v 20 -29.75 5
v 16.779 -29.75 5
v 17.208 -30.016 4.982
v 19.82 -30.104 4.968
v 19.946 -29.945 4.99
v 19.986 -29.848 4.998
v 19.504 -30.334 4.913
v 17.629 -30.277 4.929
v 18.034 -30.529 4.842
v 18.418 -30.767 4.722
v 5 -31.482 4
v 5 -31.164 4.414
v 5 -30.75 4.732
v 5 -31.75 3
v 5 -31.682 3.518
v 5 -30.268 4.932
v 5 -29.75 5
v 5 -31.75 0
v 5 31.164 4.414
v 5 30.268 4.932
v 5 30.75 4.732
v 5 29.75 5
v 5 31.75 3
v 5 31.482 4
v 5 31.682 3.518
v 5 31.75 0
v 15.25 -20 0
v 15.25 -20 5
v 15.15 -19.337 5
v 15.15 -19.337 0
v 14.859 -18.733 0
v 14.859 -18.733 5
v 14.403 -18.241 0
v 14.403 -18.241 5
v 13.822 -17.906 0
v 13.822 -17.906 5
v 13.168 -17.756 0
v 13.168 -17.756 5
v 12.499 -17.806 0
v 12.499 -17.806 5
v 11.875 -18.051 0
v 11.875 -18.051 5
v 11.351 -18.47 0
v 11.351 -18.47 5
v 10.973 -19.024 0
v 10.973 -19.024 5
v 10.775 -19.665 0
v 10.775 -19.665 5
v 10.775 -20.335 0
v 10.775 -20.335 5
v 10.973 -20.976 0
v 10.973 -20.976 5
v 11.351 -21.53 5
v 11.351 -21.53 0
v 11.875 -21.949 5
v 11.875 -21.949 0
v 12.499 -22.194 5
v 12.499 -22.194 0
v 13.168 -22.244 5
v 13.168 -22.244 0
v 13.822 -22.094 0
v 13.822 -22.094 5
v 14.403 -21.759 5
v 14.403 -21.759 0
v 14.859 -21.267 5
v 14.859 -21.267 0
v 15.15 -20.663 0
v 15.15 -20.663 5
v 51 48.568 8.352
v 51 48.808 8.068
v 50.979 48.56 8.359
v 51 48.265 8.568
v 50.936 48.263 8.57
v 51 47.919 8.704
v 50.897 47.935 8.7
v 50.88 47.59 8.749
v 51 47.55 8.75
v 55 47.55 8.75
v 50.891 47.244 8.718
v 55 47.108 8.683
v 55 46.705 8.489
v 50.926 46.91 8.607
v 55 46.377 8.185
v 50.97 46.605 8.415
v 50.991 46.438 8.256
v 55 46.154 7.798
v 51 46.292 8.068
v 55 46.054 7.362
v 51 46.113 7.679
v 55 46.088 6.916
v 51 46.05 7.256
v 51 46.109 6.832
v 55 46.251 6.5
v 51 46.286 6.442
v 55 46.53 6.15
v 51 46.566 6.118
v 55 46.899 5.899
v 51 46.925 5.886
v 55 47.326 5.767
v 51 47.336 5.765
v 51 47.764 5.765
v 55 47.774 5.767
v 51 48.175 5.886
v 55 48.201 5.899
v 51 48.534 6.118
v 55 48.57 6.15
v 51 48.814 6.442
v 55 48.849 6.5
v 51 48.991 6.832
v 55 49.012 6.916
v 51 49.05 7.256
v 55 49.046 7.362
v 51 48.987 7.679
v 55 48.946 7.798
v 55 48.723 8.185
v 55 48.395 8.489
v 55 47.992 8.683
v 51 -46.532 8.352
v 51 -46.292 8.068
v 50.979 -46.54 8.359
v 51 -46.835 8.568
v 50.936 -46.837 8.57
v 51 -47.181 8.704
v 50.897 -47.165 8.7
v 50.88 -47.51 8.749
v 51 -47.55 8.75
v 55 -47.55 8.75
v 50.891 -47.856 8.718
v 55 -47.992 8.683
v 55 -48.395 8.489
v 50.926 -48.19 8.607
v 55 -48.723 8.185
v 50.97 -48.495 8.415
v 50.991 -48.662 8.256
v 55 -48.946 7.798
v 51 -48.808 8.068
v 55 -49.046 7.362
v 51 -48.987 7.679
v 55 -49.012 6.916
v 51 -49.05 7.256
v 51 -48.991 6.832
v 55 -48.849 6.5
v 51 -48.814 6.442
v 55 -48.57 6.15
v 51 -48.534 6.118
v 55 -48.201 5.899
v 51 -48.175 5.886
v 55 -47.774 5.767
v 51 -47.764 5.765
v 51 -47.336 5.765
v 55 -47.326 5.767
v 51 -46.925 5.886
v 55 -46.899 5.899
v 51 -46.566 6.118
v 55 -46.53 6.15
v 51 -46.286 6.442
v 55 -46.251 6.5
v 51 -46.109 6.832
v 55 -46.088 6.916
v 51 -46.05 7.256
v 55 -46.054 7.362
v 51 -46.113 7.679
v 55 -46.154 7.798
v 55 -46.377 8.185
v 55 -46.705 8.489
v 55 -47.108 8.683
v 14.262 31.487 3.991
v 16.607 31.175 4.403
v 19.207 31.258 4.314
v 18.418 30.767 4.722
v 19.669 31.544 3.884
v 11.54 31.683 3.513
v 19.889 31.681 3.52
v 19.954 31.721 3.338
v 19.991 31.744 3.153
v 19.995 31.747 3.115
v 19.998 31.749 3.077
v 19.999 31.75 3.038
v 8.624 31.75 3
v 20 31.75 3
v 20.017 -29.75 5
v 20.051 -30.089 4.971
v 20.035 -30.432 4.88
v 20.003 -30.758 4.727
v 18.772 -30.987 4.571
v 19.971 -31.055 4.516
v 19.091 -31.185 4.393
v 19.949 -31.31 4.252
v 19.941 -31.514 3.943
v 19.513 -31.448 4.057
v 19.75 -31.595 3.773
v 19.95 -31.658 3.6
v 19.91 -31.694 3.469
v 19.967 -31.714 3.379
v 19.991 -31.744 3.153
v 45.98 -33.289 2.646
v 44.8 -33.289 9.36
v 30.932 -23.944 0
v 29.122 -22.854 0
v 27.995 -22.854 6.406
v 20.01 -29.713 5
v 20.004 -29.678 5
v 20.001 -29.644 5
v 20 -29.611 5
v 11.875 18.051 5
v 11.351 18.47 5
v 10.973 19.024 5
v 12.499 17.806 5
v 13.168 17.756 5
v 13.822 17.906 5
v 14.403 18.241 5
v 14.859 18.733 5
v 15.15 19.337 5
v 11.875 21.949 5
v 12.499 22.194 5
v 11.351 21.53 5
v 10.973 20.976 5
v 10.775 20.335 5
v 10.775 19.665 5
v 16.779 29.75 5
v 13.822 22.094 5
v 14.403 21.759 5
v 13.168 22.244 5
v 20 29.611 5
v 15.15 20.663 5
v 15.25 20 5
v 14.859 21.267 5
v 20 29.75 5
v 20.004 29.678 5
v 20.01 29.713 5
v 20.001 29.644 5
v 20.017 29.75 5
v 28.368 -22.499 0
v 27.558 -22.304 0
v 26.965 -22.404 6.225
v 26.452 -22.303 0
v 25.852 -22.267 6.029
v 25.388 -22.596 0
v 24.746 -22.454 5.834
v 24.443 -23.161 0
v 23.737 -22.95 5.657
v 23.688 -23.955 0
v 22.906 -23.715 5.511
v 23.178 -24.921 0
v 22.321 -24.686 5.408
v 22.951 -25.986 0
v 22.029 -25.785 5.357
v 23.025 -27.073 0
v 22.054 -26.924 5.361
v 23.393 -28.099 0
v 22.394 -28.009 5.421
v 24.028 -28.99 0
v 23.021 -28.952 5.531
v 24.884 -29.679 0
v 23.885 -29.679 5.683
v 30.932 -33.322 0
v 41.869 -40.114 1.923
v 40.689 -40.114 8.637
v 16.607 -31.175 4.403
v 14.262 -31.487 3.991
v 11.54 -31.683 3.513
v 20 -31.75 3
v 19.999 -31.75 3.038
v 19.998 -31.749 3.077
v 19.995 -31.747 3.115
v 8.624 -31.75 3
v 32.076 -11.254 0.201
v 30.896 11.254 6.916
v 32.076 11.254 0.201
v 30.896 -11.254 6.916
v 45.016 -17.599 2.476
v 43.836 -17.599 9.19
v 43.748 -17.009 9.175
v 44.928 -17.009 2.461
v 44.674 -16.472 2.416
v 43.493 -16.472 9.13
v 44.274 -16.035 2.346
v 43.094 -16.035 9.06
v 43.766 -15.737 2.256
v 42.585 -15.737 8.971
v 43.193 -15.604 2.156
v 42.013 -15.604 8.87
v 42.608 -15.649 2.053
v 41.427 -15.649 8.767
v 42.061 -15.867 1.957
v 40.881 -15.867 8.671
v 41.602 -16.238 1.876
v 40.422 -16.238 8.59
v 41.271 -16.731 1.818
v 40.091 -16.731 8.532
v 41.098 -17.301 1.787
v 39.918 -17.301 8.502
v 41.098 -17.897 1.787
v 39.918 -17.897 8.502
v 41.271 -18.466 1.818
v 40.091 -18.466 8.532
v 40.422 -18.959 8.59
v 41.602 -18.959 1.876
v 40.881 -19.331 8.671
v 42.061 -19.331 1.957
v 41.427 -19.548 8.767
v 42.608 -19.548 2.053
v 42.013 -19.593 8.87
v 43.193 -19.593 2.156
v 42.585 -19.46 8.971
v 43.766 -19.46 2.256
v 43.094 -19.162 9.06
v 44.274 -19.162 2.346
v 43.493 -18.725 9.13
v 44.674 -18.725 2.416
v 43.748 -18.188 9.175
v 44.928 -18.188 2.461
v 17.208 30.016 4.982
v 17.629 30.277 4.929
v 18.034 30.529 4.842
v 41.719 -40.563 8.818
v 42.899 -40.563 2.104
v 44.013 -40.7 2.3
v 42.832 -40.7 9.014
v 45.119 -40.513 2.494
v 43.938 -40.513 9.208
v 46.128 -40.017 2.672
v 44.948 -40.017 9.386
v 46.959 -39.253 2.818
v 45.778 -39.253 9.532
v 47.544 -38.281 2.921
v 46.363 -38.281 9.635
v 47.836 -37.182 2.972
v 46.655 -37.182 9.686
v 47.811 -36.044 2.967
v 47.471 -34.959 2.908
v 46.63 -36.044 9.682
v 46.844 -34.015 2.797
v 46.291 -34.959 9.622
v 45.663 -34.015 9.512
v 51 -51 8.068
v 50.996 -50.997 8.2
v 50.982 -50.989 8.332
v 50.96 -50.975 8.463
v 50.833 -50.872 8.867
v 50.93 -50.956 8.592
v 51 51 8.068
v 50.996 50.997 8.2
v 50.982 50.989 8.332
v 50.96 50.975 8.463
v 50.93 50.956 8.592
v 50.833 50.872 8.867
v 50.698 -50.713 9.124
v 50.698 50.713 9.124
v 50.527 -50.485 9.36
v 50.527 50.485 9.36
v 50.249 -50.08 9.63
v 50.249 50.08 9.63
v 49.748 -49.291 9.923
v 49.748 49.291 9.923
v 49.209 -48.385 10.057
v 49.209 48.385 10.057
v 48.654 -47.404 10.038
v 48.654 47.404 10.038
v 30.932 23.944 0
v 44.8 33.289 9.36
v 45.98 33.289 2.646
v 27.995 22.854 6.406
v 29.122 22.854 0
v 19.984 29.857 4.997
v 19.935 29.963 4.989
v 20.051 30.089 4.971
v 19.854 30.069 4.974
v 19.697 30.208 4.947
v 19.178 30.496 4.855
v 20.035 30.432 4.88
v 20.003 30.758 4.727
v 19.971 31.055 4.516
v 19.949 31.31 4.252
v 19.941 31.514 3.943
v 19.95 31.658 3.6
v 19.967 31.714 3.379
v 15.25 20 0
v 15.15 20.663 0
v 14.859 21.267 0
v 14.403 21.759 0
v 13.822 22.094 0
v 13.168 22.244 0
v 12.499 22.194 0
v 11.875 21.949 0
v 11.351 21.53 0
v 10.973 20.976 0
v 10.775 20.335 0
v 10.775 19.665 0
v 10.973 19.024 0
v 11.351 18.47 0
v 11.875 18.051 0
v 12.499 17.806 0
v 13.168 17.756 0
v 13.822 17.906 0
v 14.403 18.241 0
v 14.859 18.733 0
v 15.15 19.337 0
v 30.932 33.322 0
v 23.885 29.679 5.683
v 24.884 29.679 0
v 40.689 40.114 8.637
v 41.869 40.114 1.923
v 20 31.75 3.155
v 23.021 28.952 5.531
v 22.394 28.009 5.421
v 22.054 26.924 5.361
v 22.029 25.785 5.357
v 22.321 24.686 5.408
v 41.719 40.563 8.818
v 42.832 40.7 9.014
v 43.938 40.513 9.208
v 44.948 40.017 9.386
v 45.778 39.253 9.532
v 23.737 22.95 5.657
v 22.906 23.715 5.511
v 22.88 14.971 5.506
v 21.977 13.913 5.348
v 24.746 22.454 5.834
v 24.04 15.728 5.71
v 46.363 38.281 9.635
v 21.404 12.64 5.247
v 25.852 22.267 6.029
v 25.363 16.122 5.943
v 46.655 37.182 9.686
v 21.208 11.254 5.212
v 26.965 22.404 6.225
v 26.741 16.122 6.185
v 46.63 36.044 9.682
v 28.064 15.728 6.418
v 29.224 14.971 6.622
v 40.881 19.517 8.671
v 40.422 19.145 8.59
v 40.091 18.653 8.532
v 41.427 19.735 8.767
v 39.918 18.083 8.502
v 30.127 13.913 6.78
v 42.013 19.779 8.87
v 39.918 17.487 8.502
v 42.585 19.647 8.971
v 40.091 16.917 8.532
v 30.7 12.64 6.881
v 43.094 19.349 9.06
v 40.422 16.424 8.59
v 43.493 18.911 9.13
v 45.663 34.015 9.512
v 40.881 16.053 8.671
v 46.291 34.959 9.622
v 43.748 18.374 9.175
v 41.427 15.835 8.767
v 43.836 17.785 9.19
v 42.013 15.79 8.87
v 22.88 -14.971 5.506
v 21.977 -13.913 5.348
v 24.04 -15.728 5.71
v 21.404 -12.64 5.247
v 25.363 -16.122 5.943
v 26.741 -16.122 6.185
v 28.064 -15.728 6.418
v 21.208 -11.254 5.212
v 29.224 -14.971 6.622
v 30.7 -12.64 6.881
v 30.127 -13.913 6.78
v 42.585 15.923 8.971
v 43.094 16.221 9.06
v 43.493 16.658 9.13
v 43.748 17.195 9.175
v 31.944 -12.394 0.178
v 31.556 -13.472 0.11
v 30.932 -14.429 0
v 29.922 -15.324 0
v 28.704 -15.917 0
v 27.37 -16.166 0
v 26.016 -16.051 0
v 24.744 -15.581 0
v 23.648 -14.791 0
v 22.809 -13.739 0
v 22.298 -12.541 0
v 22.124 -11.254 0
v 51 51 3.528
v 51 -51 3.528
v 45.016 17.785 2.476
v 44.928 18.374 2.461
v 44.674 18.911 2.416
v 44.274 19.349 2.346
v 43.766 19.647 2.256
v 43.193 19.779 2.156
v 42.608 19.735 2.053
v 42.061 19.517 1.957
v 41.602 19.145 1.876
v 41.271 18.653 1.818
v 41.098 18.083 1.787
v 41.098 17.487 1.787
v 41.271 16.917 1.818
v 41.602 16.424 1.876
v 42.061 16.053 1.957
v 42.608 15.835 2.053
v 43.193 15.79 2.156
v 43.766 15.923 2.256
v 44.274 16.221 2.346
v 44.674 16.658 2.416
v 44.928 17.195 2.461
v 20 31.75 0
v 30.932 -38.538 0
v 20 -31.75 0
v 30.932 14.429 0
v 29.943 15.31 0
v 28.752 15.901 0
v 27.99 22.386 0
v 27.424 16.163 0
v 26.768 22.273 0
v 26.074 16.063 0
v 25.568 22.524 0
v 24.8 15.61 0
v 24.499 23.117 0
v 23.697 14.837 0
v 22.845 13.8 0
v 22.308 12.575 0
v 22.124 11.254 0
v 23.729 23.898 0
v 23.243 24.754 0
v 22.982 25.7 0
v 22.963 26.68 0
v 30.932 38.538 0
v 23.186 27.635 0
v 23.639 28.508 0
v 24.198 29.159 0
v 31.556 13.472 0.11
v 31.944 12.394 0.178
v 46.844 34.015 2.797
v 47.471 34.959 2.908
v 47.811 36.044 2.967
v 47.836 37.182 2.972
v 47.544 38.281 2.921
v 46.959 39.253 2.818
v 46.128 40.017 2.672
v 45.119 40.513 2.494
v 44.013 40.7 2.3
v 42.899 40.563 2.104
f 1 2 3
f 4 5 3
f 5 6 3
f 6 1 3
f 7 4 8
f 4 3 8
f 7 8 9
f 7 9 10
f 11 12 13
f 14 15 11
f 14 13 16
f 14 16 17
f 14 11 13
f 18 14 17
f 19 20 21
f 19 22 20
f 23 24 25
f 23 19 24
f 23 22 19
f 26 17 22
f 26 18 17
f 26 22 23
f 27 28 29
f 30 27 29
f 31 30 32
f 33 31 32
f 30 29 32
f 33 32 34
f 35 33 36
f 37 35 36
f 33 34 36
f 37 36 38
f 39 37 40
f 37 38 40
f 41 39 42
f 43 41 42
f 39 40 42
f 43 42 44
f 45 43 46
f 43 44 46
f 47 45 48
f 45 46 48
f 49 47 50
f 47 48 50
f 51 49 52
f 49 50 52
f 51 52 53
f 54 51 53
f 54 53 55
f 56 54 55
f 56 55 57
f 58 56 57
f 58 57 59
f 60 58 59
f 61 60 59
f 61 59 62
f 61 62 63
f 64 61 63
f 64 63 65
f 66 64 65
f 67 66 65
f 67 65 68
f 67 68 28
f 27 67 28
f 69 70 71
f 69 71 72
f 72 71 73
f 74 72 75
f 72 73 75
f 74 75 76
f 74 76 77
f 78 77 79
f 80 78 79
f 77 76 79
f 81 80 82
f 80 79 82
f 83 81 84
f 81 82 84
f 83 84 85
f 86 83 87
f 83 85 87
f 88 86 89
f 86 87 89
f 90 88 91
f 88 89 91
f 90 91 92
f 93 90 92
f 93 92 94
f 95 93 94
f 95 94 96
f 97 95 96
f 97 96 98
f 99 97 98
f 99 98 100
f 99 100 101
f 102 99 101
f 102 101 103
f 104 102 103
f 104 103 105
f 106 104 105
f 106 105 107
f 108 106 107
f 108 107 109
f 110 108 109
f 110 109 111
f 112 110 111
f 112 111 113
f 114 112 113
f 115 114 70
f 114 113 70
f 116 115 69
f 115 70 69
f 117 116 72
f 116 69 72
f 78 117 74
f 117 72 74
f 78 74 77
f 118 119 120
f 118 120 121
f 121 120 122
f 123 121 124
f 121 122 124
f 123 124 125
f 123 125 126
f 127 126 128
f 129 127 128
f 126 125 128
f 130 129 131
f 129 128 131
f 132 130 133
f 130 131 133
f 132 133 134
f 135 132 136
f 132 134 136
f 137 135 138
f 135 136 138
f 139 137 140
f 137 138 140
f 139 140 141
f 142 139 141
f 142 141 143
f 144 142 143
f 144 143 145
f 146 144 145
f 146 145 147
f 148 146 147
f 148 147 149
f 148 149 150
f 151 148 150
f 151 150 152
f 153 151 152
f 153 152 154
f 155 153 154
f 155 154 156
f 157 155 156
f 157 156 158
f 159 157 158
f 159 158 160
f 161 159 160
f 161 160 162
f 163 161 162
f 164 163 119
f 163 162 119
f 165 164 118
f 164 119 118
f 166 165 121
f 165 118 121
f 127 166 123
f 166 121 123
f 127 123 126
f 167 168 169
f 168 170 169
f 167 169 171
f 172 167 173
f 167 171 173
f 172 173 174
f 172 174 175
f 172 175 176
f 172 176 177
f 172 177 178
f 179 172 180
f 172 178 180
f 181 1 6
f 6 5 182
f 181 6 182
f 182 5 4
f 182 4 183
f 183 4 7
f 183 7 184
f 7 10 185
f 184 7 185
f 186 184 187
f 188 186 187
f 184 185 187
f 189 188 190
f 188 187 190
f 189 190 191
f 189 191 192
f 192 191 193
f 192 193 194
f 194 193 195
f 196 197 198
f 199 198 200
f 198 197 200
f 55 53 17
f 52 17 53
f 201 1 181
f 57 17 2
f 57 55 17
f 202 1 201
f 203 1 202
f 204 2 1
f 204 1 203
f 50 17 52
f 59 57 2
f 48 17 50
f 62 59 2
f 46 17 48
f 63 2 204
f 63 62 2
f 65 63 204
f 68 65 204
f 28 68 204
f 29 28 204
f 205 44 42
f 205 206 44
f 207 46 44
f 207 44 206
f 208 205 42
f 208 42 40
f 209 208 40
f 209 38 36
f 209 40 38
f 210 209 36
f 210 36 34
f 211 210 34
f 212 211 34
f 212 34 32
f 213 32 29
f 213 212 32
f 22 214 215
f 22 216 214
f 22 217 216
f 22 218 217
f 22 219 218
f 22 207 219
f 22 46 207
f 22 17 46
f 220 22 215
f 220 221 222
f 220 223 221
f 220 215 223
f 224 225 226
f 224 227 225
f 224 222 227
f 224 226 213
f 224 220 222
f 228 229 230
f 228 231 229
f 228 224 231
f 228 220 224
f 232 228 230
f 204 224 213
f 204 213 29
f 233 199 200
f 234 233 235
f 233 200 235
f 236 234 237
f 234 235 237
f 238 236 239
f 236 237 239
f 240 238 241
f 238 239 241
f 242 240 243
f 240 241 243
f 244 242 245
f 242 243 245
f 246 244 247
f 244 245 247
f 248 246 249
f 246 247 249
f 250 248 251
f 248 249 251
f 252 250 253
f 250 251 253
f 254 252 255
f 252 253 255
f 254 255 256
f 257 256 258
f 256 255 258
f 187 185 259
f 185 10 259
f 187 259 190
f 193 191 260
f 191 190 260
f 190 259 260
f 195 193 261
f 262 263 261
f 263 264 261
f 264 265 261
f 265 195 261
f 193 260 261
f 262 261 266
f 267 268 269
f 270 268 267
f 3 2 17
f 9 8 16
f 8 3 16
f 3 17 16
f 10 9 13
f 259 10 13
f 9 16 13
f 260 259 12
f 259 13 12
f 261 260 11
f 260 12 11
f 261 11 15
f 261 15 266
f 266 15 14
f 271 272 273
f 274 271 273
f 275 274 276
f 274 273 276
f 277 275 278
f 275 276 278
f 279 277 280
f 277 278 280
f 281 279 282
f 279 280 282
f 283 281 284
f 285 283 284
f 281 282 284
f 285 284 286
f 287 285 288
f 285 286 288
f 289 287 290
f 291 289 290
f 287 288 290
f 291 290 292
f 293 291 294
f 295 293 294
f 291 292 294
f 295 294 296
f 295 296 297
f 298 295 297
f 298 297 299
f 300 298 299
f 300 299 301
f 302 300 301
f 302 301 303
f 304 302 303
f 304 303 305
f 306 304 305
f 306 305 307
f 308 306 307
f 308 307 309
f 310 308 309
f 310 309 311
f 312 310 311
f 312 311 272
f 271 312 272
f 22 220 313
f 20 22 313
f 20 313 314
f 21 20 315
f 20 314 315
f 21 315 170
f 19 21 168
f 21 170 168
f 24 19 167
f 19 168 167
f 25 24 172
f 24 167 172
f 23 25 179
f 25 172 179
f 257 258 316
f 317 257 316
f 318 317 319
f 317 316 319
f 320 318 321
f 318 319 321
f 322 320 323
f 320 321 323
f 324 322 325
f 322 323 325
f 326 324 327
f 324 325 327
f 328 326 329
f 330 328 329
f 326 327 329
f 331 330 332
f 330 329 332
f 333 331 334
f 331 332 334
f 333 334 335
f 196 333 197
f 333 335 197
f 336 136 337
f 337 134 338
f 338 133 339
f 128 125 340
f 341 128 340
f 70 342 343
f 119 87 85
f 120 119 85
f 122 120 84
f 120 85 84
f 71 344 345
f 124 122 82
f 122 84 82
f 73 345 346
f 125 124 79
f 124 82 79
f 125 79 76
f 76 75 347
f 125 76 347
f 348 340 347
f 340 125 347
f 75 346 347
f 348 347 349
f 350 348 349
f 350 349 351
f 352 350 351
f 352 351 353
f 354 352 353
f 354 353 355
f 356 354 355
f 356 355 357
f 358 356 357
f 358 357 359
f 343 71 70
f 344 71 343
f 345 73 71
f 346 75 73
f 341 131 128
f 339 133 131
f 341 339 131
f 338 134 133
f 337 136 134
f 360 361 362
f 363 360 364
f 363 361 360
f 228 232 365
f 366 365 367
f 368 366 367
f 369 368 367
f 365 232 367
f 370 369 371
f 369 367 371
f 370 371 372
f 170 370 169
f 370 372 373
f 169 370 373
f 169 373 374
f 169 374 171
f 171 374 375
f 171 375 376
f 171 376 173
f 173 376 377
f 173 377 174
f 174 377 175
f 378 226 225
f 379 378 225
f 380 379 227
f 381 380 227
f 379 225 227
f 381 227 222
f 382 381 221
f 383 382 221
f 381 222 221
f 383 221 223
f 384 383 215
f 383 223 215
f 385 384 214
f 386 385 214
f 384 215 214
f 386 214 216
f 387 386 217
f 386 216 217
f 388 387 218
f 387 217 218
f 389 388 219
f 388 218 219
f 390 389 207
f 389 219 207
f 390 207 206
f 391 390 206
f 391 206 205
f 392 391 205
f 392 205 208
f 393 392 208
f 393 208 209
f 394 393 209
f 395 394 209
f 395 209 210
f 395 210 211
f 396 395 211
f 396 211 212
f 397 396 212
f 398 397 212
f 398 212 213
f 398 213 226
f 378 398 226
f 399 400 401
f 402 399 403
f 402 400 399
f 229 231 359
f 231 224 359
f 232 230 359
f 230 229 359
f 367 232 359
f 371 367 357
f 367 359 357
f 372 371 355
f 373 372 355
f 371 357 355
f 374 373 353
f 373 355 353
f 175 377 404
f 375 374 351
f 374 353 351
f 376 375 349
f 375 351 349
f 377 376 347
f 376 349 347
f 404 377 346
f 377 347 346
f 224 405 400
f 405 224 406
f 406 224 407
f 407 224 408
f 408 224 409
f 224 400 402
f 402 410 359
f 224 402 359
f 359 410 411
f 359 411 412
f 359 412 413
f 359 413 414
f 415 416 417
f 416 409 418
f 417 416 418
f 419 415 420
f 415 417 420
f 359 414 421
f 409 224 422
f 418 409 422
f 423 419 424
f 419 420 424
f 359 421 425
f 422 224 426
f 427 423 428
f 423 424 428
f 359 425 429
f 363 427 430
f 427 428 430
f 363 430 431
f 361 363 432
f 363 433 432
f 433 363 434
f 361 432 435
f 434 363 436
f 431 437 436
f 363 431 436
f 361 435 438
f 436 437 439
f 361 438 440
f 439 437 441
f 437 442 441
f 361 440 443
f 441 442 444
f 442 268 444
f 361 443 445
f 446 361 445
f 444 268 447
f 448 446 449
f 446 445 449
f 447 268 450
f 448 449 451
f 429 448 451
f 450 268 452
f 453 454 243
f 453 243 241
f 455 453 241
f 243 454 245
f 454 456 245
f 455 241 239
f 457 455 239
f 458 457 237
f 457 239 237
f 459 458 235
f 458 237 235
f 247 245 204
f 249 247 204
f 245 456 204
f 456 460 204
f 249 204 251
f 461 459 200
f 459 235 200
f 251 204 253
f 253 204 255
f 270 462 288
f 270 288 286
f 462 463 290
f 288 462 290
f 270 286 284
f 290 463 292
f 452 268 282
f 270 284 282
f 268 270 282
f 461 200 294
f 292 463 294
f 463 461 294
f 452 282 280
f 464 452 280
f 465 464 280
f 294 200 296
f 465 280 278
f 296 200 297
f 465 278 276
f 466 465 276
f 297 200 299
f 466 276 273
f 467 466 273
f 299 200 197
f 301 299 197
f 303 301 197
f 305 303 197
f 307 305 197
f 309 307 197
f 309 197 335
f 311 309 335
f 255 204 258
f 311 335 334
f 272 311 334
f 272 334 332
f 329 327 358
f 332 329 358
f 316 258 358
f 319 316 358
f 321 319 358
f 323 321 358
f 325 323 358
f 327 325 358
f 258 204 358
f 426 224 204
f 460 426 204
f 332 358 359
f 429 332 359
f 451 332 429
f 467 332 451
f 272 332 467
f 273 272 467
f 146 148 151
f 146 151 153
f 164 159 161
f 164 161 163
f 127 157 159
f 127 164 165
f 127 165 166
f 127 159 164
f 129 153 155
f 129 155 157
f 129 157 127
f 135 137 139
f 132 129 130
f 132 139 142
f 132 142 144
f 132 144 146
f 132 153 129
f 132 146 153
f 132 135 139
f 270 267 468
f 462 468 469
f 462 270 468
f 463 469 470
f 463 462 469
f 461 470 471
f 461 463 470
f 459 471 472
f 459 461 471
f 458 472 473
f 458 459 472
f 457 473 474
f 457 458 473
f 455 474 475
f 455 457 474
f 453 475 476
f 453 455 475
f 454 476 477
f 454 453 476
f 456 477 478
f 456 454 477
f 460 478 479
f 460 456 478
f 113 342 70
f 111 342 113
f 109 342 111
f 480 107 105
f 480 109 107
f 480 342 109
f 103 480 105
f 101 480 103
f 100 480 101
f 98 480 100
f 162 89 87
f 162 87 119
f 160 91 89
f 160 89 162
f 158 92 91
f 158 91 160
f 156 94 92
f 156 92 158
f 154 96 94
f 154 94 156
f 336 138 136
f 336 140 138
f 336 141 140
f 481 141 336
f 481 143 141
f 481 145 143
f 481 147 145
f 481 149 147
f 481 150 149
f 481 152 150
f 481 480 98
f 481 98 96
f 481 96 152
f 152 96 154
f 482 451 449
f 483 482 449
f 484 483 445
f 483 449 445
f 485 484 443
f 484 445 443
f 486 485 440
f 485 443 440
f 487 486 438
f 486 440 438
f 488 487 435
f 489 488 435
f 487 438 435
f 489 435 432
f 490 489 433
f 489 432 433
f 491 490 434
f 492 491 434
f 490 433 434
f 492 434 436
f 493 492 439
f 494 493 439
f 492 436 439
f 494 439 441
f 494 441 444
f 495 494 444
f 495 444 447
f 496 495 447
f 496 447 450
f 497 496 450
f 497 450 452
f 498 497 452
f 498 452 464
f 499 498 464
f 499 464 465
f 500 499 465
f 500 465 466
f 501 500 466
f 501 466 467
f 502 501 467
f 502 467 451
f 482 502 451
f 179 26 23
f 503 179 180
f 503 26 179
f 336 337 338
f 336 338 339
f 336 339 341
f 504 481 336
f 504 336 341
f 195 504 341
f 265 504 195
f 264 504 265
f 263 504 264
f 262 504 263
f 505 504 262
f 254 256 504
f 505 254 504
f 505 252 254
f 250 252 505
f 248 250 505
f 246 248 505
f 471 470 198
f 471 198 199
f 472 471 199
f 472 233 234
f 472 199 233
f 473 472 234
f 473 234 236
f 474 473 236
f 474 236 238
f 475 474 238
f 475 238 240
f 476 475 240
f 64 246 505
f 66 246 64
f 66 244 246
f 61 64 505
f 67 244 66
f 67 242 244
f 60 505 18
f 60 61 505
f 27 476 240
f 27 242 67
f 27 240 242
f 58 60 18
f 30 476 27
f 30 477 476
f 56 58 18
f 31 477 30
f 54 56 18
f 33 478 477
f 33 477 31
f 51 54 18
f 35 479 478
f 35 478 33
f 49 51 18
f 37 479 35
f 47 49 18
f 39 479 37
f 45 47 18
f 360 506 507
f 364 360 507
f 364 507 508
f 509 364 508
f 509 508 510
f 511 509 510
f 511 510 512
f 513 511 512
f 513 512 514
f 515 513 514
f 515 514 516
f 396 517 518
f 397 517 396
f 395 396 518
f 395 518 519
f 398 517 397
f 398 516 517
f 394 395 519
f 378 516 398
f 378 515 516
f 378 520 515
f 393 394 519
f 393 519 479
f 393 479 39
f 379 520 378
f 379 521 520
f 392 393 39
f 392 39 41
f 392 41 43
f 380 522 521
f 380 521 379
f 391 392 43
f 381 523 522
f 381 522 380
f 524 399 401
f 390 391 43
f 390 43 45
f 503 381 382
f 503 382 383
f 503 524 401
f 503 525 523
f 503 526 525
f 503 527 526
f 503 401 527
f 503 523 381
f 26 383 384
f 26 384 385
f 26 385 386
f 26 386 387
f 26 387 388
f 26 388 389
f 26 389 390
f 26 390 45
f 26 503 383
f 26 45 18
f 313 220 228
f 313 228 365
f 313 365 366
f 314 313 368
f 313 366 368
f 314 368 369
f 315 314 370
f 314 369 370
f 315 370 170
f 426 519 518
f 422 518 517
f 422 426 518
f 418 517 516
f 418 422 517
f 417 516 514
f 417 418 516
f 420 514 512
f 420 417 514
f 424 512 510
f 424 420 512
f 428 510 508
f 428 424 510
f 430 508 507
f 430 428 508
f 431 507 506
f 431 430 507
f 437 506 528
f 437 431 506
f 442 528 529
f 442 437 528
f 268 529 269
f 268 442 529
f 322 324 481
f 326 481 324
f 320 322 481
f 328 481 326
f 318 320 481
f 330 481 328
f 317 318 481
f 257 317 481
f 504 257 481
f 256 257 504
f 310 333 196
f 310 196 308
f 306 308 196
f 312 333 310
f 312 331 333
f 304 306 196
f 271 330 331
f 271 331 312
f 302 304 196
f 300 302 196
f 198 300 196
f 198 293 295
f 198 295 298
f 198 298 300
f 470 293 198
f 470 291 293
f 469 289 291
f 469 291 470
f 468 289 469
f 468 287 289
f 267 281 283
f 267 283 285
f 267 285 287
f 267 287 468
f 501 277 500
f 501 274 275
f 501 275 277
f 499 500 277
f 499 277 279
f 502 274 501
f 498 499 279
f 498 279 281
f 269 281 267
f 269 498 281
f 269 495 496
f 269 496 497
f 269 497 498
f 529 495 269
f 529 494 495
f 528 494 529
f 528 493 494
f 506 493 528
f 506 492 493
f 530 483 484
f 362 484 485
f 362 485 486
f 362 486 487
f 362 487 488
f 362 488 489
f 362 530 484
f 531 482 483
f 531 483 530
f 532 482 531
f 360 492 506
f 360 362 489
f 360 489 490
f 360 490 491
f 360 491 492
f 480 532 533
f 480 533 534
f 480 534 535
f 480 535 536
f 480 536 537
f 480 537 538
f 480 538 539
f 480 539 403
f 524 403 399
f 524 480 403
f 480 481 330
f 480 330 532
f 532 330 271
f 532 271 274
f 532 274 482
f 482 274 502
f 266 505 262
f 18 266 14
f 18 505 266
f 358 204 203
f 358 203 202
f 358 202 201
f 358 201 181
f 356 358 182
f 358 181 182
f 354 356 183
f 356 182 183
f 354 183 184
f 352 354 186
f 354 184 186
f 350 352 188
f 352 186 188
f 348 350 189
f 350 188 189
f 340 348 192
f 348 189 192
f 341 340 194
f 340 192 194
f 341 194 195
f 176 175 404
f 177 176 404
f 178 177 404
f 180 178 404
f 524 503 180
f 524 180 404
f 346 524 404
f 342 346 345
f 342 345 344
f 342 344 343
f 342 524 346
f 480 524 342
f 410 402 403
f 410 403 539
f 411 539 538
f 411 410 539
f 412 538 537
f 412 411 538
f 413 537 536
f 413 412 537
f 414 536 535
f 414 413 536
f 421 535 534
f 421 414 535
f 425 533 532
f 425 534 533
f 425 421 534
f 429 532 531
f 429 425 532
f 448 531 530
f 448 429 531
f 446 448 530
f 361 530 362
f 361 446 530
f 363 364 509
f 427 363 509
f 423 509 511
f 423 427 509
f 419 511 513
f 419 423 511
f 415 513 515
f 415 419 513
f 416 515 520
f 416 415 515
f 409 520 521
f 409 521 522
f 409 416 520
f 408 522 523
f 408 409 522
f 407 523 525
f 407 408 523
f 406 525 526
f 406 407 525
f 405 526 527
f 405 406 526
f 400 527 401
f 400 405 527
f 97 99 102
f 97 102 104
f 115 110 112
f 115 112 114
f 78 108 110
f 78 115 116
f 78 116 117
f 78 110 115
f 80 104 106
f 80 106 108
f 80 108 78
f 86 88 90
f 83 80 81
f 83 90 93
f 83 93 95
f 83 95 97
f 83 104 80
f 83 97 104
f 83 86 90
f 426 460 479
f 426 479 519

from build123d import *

# Parameters (mm, degrees)
BOSS_EXTRUDE1_DEPTH     = 12
CUT_EXTRUDE1_DEPTH      = 74.116345642
CUT_EXTRUDE1_DEPTH_BACK = 74.116345642
SKETCH4_R               = 1.5
BOSS_EXTRUDE2_DEPTH     = 4
SKETCH5_R               = 2.25
CUT_EXTRUDE2_DEPTH      = 76.204404791
FILLET1_R               = 2
CUT_EXTRUDE6_DEPTH      = 100.869521891
CUT_EXTRUDE6_DEPTH_BACK = 100.869521891
CUT_EXTRUDE7_DEPTH      = 10
CUT_EXTRUDE8_DEPTH      = 76.685850531
SKETCH12_R              = 2
CUT_EXTRUDE9_DEPTH      = 10


with BuildPart() as part:
    # Sketch1 → Boss-Extrude1 (new body)
    with BuildSketch(Plane.XY):
        Polygon((5, 31.75), (20, 31.75), (51, 51), (51, -51), (20, -31.75), (5, -31.75), align=None)
    extrude(amount=BOSS_EXTRUDE1_DEPTH)

    # Sketch3 → Cut-Extrude1 (cut, two sides: drawn at the far end of the back side and taken through both)
    with BuildSketch(Plane(origin=(0, 0, 0), x_dir=(1, 0, 0), z_dir=(0, 1, 0)).offset(-CUT_EXTRUDE1_DEPTH_BACK)):
        Polygon((5, -5), (20, -5), (51, -10.45), (51, -12), (5, -12), align=None)
    extrude(amount=CUT_EXTRUDE1_DEPTH + CUT_EXTRUDE1_DEPTH_BACK, mode=Mode.SUBTRACT)

    # Sketch4 → Boss-Extrude2 (add)
    with BuildSketch(Plane(origin=(51, 0, 0), x_dir=(0, 0, -1), z_dir=(1, 0, 0))):
        with Locations(Location((-7.25, 47.55, 0), (0, 0, 180))):
            Circle(SKETCH4_R)
        with Locations(Location((-7.25, -47.55, 0), (0, 0, 180))):
            Circle(SKETCH4_R)
    extrude(amount=BOSS_EXTRUDE2_DEPTH)

    # Sketch5 → Cut-Extrude2 (cut, through all)
    with BuildSketch(Plane.XY.offset(5)):
        with Locations((13, 20)):
            Circle(SKETCH5_R)
        with Locations((13, -20)):
            Circle(SKETCH5_R)
    extrude(amount=-CUT_EXTRUDE2_DEPTH, mode=Mode.SUBTRACT)

    # Fillet1
    # the kernel refuses this fillet: 2 mm, written as the material it takes off along each edge
    with BuildSketch(Plane(origin=(25, 31.75, 5), x_dir=(0, 0, -1), z_dir=(-1, 0, 0))) as fillet1_piece_1_section:
        with BuildLine():
            CenterArc((FILLET1_R, FILLET1_R), FILLET1_R, 180, 90)
            Line((0, FILLET1_R), (0, 0))
            Line((0, 0), (FILLET1_R, 0))
        make_face()
    fillet1_piece_1 = extrude(amount=25, mode=Mode.PRIVATE)
    fillet1_piece_1 = split(fillet1_piece_1, bisect_by=Plane(origin=(18.715742413, 30.952517466, 4.969963475), z_dir=(0.5275333931354667, -0.8495342954389665, 0)), keep=Keep.TOP, mode=Mode.PRIVATE)
    fillet1_piece_1 = split(fillet1_piece_1, bisect_by=Plane(origin=(18.98425176, 30.56216658, 4.821424906), z_dir=(-0.17315094766757883, 0, 0.9848952986596187)), keep=Keep.TOP, mode=Mode.PRIVATE)
    add(fillet1_piece_1, mode=Mode.SUBTRACT)
    with BuildSketch(Plane(origin=(25, 31.75, 5), x_dir=(0, 0, -1), z_dir=(-1, 0, 0))) as fillet1_piece_2_section:
        with BuildLine():
            CenterArc((FILLET1_R, FILLET1_R), FILLET1_R, 180, 90)
            Line((0, FILLET1_R), (0, 0))
            Line((0, 0), (FILLET1_R, 0))
        make_face()
    fillet1_piece_2 = extrude(amount=25, mode=Mode.PRIVATE)
    fillet1_piece_2 = split(fillet1_piece_2, bisect_by=Plane(origin=(17.89893605, 30.445307063, 4.049330952), z_dir=(-0.5275333931354667, 0.8495342954389665, 0)), keep=Keep.TOP, mode=Mode.PRIVATE)
    fillet1_piece_2 = split(fillet1_piece_2, bisect_by=Plane(origin=(17.101561994, 31.604505702, 4.490435899), z_dir=(0.17315094766757883, 0, -0.9848952986596187)), keep=Keep.TOP, mode=Mode.PRIVATE)
    add(fillet1_piece_2, mode=Mode.SUBTRACT)
    with BuildSketch(Plane(origin=(25, 31.75, 5), x_dir=(0, 0, -1), z_dir=(-1, 0, 0))) as fillet1_piece_3_section:
        with BuildLine():
            CenterArc((FILLET1_R, FILLET1_R), FILLET1_R, 180, 90)
            Line((0, FILLET1_R), (0, 0))
            Line((0, 0), (FILLET1_R, 0))
        make_face()
    fillet1_piece_3 = extrude(amount=25, mode=Mode.PRIVATE)
    fillet1_piece_3 = split(fillet1_piece_3, bisect_by=Plane(origin=(11.619741212, 26.546129624, 4.600643736), z_dir=(-0.5275333931354667, 0.8495342954389665, 0)), keep=Keep.TOP, mode=Mode.PRIVATE)
    fillet1_piece_3 = split(fillet1_piece_3, bisect_by=Plane(origin=(8.954230644, 31.275365282, 3.058082484), z_dir=(-0.17315094766757883, 0, 0.9848952986596187)), keep=Keep.TOP, mode=Mode.PRIVATE)
    add(fillet1_piece_3, mode=Mode.SUBTRACT)
    with BuildSketch(Plane(origin=(54.833361303, 53.380393713, 11.123929648), x_dir=(0.12548912150255187, 0.07792469641690664, -0.9890299399274274), z_dir=(-0.8402148531842905, -0.5217463201224826, -0.14771519193078717))) as fillet1_piece_4_section:
        with BuildLine():
            CenterArc((FILLET1_R * 0.9124716824, FILLET1_R), FILLET1_R, 185.240868247, 84.759131753)
            Line((-FILLET1_R * 0.0833478159779, FILLET1_R * 0.908657093052), (0, 0))
            Line((0, 0), (FILLET1_R * 0.9124716824, 0))
        make_face()
    fillet1_piece_4 = extrude(amount=46.020041731, mode=Mode.PRIVATE)
    fillet1_piece_4 = split(fillet1_piece_4, bisect_by=Plane(origin=(38.858531896, 31.75, 7.92634129), z_dir=(0, 1, 0)), keep=Keep.TOP, mode=Mode.PRIVATE)
    fillet1_piece_4 = split(fillet1_piece_4, bisect_by=Plane(origin=(38.858531896, 42.968514932, 5), z_dir=(0, 0, 1)), keep=Keep.TOP, mode=Mode.PRIVATE)
    add(fillet1_piece_4, mode=Mode.SUBTRACT)
    with BuildSketch(Plane(origin=(54.833361303, 53.380393713, 11.123929648), x_dir=(0.12548912150255187, 0.07792469641690664, -0.9890299399274274), z_dir=(-0.8402148531842905, -0.5217463201224826, -0.14771519193078717))) as fillet1_piece_5_section:
        with BuildLine():
            CenterArc((FILLET1_R * 0.9124716824, FILLET1_R), FILLET1_R, 185.240868247, 84.759131753)
            Line((-FILLET1_R * 0.0833478159779, FILLET1_R * 0.908657093052), (0, 0))
            Line((0, 0), (FILLET1_R * 0.9124716824, 0))
        make_face()
    fillet1_piece_5 = extrude(amount=46.020041731, mode=Mode.PRIVATE)
    fillet1_piece_5 = split(fillet1_piece_5, bisect_by=Plane(origin=(21.093126752, 31.75, 5.163454889), z_dir=(0, -1, 0)), keep=Keep.TOP, mode=Mode.PRIVATE)
    fillet1_piece_5 = split(fillet1_piece_5, bisect_by=Plane(origin=(21.093126752, 31.172659336, 5), z_dir=(0, 0, 1)), keep=Keep.TOP, mode=Mode.PRIVATE)
    add(fillet1_piece_5, mode=Mode.SUBTRACT)
    with BuildSketch(Plane(origin=(54.833361303, 53.380393713, 11.123929648), x_dir=(0.12548912150255187, 0.07792469641690664, -0.9890299399274274), z_dir=(-0.8402148531842905, -0.5217463201224826, -0.14771519193078717))) as fillet1_piece_6_section:
        with BuildLine():
            CenterArc((FILLET1_R * 0.9124716824, FILLET1_R), FILLET1_R, 185.240868247, 84.759131753)
            Line((-FILLET1_R * 0.0833478159779, FILLET1_R * 0.908657093052), (0, 0))
            Line((0, 0), (FILLET1_R * 0.9124716824, 0))
        make_face()
    fillet1_piece_6 = extrude(amount=46.020041731, mode=Mode.PRIVATE)
    fillet1_piece_6 = split(fillet1_piece_6, bisect_by=Plane(origin=(22.647114754, 31.75, 4.574160992), z_dir=(0, 1, 0)), keep=Keep.TOP, mode=Mode.PRIVATE)
    fillet1_piece_6 = split(fillet1_piece_6, bisect_by=Plane(origin=(22.647114754, 33.254110258, 5), z_dir=(0, 0, -1)), keep=Keep.TOP, mode=Mode.PRIVATE)
    add(fillet1_piece_6, mode=Mode.SUBTRACT)
    with BuildSketch(Plane(origin=(16.166638697, -29.369606287, 4.326070352), x_dir=(0.12548912150255273, -0.07792469641690525, -0.9890299399274274), z_dir=(0.8402148531842905, -0.5217463201224826, 0.14771519193078717))) as fillet1_piece_7_section:
        with BuildLine():
            CenterArc((FILLET1_R * 0.9124716824, FILLET1_R), FILLET1_R, 185.240868247, 84.759131753)
            Line((-FILLET1_R * 0.0833478159779, FILLET1_R * 0.908657093052), (0, 0))
            Line((0, 0), (FILLET1_R * 0.9124716824, 0))
        make_face()
    fillet1_piece_7 = extrude(amount=46.020041731, mode=Mode.PRIVATE)
    fillet1_piece_7 = split(fillet1_piece_7, bisect_by=Plane(origin=(21.093126752, -31.172659336, 5), z_dir=(0, 0, 1)), keep=Keep.TOP, mode=Mode.PRIVATE)
    fillet1_piece_7 = split(fillet1_piece_7, bisect_by=Plane(origin=(21.093126752, -31.75, 5.163454889), z_dir=(0, 1, 0)), keep=Keep.TOP, mode=Mode.PRIVATE)
    add(fillet1_piece_7, mode=Mode.SUBTRACT)
    with BuildSketch(Plane(origin=(16.166638697, -29.369606287, 4.326070352), x_dir=(0.12548912150255273, -0.07792469641690525, -0.9890299399274274), z_dir=(0.8402148531842905, -0.5217463201224826, 0.14771519193078717))) as fillet1_piece_8_section:
        with BuildLine():
            CenterArc((FILLET1_R * 0.9124716824, FILLET1_R), FILLET1_R, 185.240868247, 84.759131753)
            Line((-FILLET1_R * 0.0833478159779, FILLET1_R * 0.908657093052), (0, 0))
            Line((0, 0), (FILLET1_R * 0.9124716824, 0))
        make_face()
    fillet1_piece_8 = extrude(amount=46.020041731, mode=Mode.PRIVATE)
    fillet1_piece_8 = split(fillet1_piece_8, bisect_by=Plane(origin=(22.647114754, -33.254110258, 5), z_dir=(0, 0, -1)), keep=Keep.TOP, mode=Mode.PRIVATE)
    fillet1_piece_8 = split(fillet1_piece_8, bisect_by=Plane(origin=(22.647114754, -31.75, 4.574160992), z_dir=(0, -1, 0)), keep=Keep.TOP, mode=Mode.PRIVATE)
    add(fillet1_piece_8, mode=Mode.SUBTRACT)
    with BuildSketch(Plane(origin=(16.166638697, -29.369606287, 4.326070352), x_dir=(0.12548912150255273, -0.07792469641690525, -0.9890299399274274), z_dir=(0.8402148531842905, -0.5217463201224826, 0.14771519193078717))) as fillet1_piece_9_section:
        with BuildLine():
            CenterArc((FILLET1_R * 0.9124716824, FILLET1_R), FILLET1_R, 185.240868247, 84.759131753)
            Line((-FILLET1_R * 0.0833478159779, FILLET1_R * 0.908657093052), (0, 0))
            Line((0, 0), (FILLET1_R * 0.9124716824, 0))
        make_face()
    fillet1_piece_9 = extrude(amount=46.020041731, mode=Mode.PRIVATE)
    fillet1_piece_9 = split(fillet1_piece_9, bisect_by=Plane(origin=(38.858531896, -42.968514932, 5), z_dir=(0, 0, 1)), keep=Keep.TOP, mode=Mode.PRIVATE)
    fillet1_piece_9 = split(fillet1_piece_9, bisect_by=Plane(origin=(38.858531896, -31.75, 7.92634129), z_dir=(0, -1, 0)), keep=Keep.TOP, mode=Mode.PRIVATE)
    add(fillet1_piece_9, mode=Mode.SUBTRACT)
    with BuildSketch(Plane(origin=(0, -31.75, 5), x_dir=(0, 1, 0), z_dir=(1, 0, 0))) as fillet1_piece_10_section:
        with BuildLine():
            CenterArc((FILLET1_R, -FILLET1_R), FILLET1_R, 90, 90)
            Line((0, -FILLET1_R), (0, 0))
            Line((0, 0), (FILLET1_R, 0))
        make_face()
    fillet1_piece_10 = extrude(amount=25, mode=Mode.PRIVATE)
    fillet1_piece_10 = split(fillet1_piece_10, bisect_by=Plane(origin=(8.954230648, -31.275365282, 3.058082485), z_dir=(-0.17315094766757883, 0, 0.9848952986596187)), keep=Keep.TOP, mode=Mode.PRIVATE)
    fillet1_piece_10 = split(fillet1_piece_10, bisect_by=Plane(origin=(11.619741215, -26.546129625, 4.600643736), z_dir=(-0.5275333931354667, -0.8495342954389665, 0)), keep=Keep.TOP, mode=Mode.PRIVATE)
    add(fillet1_piece_10, mode=Mode.SUBTRACT)
    with BuildSketch(Plane(origin=(0, -31.75, 5), x_dir=(0, 1, 0), z_dir=(1, 0, 0))) as fillet1_piece_11_section:
        with BuildLine():
            CenterArc((FILLET1_R, -FILLET1_R), FILLET1_R, 90, 90)
            Line((0, -FILLET1_R), (0, 0))
            Line((0, 0), (FILLET1_R, 0))
        make_face()
    fillet1_piece_11 = extrude(amount=25, mode=Mode.PRIVATE)
    fillet1_piece_11 = split(fillet1_piece_11, bisect_by=Plane(origin=(17.101561993, -31.604505702, 4.490435899), z_dir=(0.17315094766757883, 0, -0.9848952986596187)), keep=Keep.TOP, mode=Mode.PRIVATE)
    fillet1_piece_11 = split(fillet1_piece_11, bisect_by=Plane(origin=(17.89893605, -30.445307063, 4.049330952), z_dir=(-0.5275333931354667, -0.8495342954389665, 0)), keep=Keep.TOP, mode=Mode.PRIVATE)
    add(fillet1_piece_11, mode=Mode.SUBTRACT)
    with BuildSketch(Plane(origin=(0, -31.75, 5), x_dir=(0, 1, 0), z_dir=(1, 0, 0))) as fillet1_piece_12_section:
        with BuildLine():
            CenterArc((FILLET1_R, -FILLET1_R), FILLET1_R, 90, 90)
            Line((0, -FILLET1_R), (0, 0))
            Line((0, 0), (FILLET1_R, 0))
        make_face()
    fillet1_piece_12 = extrude(amount=25, mode=Mode.PRIVATE)
    fillet1_piece_12 = split(fillet1_piece_12, bisect_by=Plane(origin=(18.984251758, -30.56216658, 4.821424906), z_dir=(-0.17315094766757883, 0, 0.9848952986596187)), keep=Keep.TOP, mode=Mode.PRIVATE)
    fillet1_piece_12 = split(fillet1_piece_12, bisect_by=Plane(origin=(18.715742412, -30.952517465, 4.969963474), z_dir=(0.5275333931354667, 0.8495342954389665, 0)), keep=Keep.TOP, mode=Mode.PRIVATE)
    add(fillet1_piece_12, mode=Mode.SUBTRACT)
    with BuildSketch(Plane(origin=(51, 56.95571402, 10.45), x_dir=(0, 0, -1), z_dir=(0, -1, 0))) as fillet1_piece_13_section:
        with BuildLine():
            CenterArc((FILLET1_R * 1.19114280398, -FILLET1_R), FILLET1_R, 90, 99.971072614)
            Line((FILLET1_R * 0.206247505316, -FILLET1_R * 1.17315094767), (0, 0))
            Line((0, 0), (FILLET1_R * 1.19114280398, 0))
        make_face()
    fillet1_piece_13 = extrude(amount=113.91142804, mode=Mode.PRIVATE)
    fillet1_piece_13 = fillet1_piece_13 - Plane(origin=(50.456443641, -47.55, 7.25), x_dir=(0, 0, 1), z_dir=(-1, 0, 0)) * Cylinder(1.5, 238, mode=Mode.PRIVATE)
    fillet1_piece_13 = fillet1_piece_13 - Plane(origin=(50.456443641, 47.55, 7.25), x_dir=(0, 0, 1), z_dir=(-1, 0, 0)) * Cylinder(1.5, 238, mode=Mode.PRIVATE)
    add(fillet1_piece_13, mode=Mode.SUBTRACT)
    with BuildSketch(Plane(origin=(51, 56, 0), x_dir=(-1, 0, 0), z_dir=(0, -1, 0))) as fillet1_piece_14:
        with BuildLine():
            CenterArc((FILLET1_R, -FILLET1_R), FILLET1_R, 90, 90)
            Line((0, -FILLET1_R), (0, 0))
            Line((0, 0), (FILLET1_R, 0))
        make_face()
    extrude(amount=112, mode=Mode.SUBTRACT)
    with BuildSketch(Plane(origin=(25, 31.75, 5), x_dir=(0, 0, -1), z_dir=(-1, 0, 0))) as fillet1_piece_15a_section:
        with BuildLine():
            CenterArc((FILLET1_R, FILLET1_R), FILLET1_R, 180, 90)
            Line((0, FILLET1_R), (0, 0))
            Line((0, 0), (FILLET1_R, 0))
        make_face()
    fillet1_piece_15a = extrude(amount=25, mode=Mode.PRIVATE)
    fillet1_piece_15a = split(fillet1_piece_15a, bisect_by=Plane(origin=(21.447626234, 32.648929194, 4.553184852), z_dir=(0.5275333931354667, -0.8495342954389665, 0)), keep=Keep.TOP, mode=Mode.PRIVATE)
    fillet1_piece_15a = split(fillet1_piece_15a, bisect_by=Plane(origin=(22.147583846, 31.288330463, 5.377559095), z_dir=(0.17315094766757883, 0, -0.9848952986596187)), keep=Keep.TOP, mode=Mode.PRIVATE)
    with BuildSketch(Plane(origin=(54.833361303, 53.380393713, 11.123929648), x_dir=(0.12548912150255187, 0.07792469641690664, -0.9890299399274274), z_dir=(-0.8402148531842905, -0.5217463201224826, -0.14771519193078717))) as fillet1_piece_15b_section:
        with BuildLine():
            CenterArc((FILLET1_R * 0.9124716824, FILLET1_R), FILLET1_R, 185.240868247, 84.759131753)
            Line((-FILLET1_R * 0.0833478159779, FILLET1_R * 0.908657093052), (0, 0))
            Line((0, 0), (FILLET1_R * 0.9124716824, 0))
        make_face()
    fillet1_piece_15b = extrude(amount=46.020041731, mode=Mode.PRIVATE)
    fillet1_piece_15b = split(fillet1_piece_15b, bisect_by=Plane(origin=(18.418601741, 31.75, 4.307776875), z_dir=(0, -1, 0)), keep=Keep.TOP, mode=Mode.PRIVATE)
    fillet1_piece_15b = split(fillet1_piece_15b, bisect_by=Plane(origin=(18.418601741, 30.298172554, 5), z_dir=(0, 0, -1)), keep=Keep.TOP, mode=Mode.PRIVATE)
    fillet1_piece_15 = fillet1_piece_15a & fillet1_piece_15b
    add(fillet1_piece_15, mode=Mode.SUBTRACT)
    with BuildSketch(Plane(origin=(0, -31.75, 5), x_dir=(0, 1, 0), z_dir=(1, 0, 0))) as fillet1_piece_16a_section:
        with BuildLine():
            CenterArc((FILLET1_R, -FILLET1_R), FILLET1_R, 90, 90)
            Line((0, -FILLET1_R), (0, 0))
            Line((0, 0), (FILLET1_R, 0))
        make_face()
    fillet1_piece_16a = extrude(amount=25, mode=Mode.PRIVATE)
    fillet1_piece_16a = split(fillet1_piece_16a, bisect_by=Plane(origin=(22.147583841, -31.288330462, 5.377559095), z_dir=(0.17315094766757883, 0, -0.9848952986596187)), keep=Keep.TOP, mode=Mode.PRIVATE)
    fillet1_piece_16a = split(fillet1_piece_16a, bisect_by=Plane(origin=(21.447626231, -32.648929192, 4.553184851), z_dir=(0.5275333931354667, 0.8495342954389665, 0)), keep=Keep.TOP, mode=Mode.PRIVATE)
    with BuildSketch(Plane(origin=(16.166638697, -29.369606287, 4.326070352), x_dir=(0.12548912150255273, -0.07792469641690525, -0.9890299399274274), z_dir=(0.8402148531842905, -0.5217463201224826, 0.14771519193078717))) as fillet1_piece_16b_section:
        with BuildLine():
            CenterArc((FILLET1_R * 0.9124716824, FILLET1_R), FILLET1_R, 185.240868247, 84.759131753)
            Line((-FILLET1_R * 0.0833478159779, FILLET1_R * 0.908657093052), (0, 0))
            Line((0, 0), (FILLET1_R * 0.9124716824, 0))
        make_face()
    fillet1_piece_16b = extrude(amount=46.020041731, mode=Mode.PRIVATE)
    fillet1_piece_16b = split(fillet1_piece_16b, bisect_by=Plane(origin=(18.418601741, -30.298172554, 5), z_dir=(0, 0, -1)), keep=Keep.TOP, mode=Mode.PRIVATE)
    fillet1_piece_16b = split(fillet1_piece_16b, bisect_by=Plane(origin=(18.418601741, -31.75, 4.307776875), z_dir=(0, 1, 0)), keep=Keep.TOP, mode=Mode.PRIVATE)
    fillet1_piece_16 = fillet1_piece_16a & fillet1_piece_16b
    add(fillet1_piece_16, mode=Mode.SUBTRACT)

    # Sketch9 → Cut-Extrude6 (cut, two sides: drawn at the far end of the back side and taken through both)
    with BuildSketch(Plane(origin=(0, -31.75, 0), x_dir=(-1, 0, 0), z_dir=(0, -1, 0)).offset(-CUT_EXTRUDE6_DEPTH_BACK)):
        Polygon((-51, -3.528133081), (-30.931720088, 0), (-51, 0), align=None)
    extrude(amount=CUT_EXTRUDE6_DEPTH + CUT_EXTRUDE6_DEPTH_BACK, mode=Mode.SUBTRACT)

    # Sketch10 → Cut-Extrude7 (cut)
    with BuildSketch(Plane(origin=(-0.253052758, 0, 1.43938266), x_dir=(0.9848952986596188, 0, 0.17315094766757885), z_dir=(-0.17315094766757885, 0, 0.9848952986596188))):
        with BuildLine():
            Line((45.743787307, 33.288733998), (28.681773623, 22.853807596))
            ThreePointArc((28.681773623, 22.853807596), (23.182385605, 24.179225052), (24.507803062, 29.67861307))
            Line((24.507803062, 29.67861307), (41.569816746, 40.113539472))
            ThreePointArc((41.569816746, 40.113539472), (47.069204764, 38.788122016), (45.743787307, 33.288733998))
        make_face()
    cut_extrude7 = extrude(amount=-CUT_EXTRUDE7_DEPTH, mode=Mode.SUBTRACT)

    # Mirror2: Cut-Extrude7 across plane
    add(cut_extrude7.mirror(Plane.ZX), mode=Mode.SUBTRACT)

    # Sketch11 → Cut-Extrude8 (cut, through all)
    with BuildSketch(Plane(origin=(-0.253052758, 0, 1.43938266), x_dir=(0.9848952986596188, 0, 0.17315094766757885), z_dir=(-0.17315094766757885, 0, 0.9848952986596188))):
        with BuildLine():
            Line((31.626592624, 11.254011747), (31.626592624, -11.254011747))
            ThreePointArc((31.626592624, -11.254011747), (26.708411928, -16.172192443), (21.790231232, -11.254011747))
            Line((21.790231232, -11.254011747), (21.790231232, 11.254011747))
            ThreePointArc((21.790231232, 11.254011747), (26.708411928, 16.172192443), (31.626592624, 11.254011747))
        make_face()
    extrude(amount=-CUT_EXTRUDE8_DEPTH, mode=Mode.SUBTRACT)

    # Sketch12 → Cut-Extrude9 (cut)
    with BuildSketch(Plane(origin=(-0.253052758, 0, 1.43938266), x_dir=(0.9848952986596187, 0, 0.17315094766757885), z_dir=(-0.17315094766757885, 0, 0.9848952986596188))):
        with Locations((42.764756369, 17.78484358)):
            Circle(SKETCH12_R)
        with Locations((42.764756369, -17.598635798)):
            Circle(SKETCH12_R)
    extrude(amount=-CUT_EXTRUDE9_DEPTH, mode=Mode.SUBTRACT)


solid = part.part
